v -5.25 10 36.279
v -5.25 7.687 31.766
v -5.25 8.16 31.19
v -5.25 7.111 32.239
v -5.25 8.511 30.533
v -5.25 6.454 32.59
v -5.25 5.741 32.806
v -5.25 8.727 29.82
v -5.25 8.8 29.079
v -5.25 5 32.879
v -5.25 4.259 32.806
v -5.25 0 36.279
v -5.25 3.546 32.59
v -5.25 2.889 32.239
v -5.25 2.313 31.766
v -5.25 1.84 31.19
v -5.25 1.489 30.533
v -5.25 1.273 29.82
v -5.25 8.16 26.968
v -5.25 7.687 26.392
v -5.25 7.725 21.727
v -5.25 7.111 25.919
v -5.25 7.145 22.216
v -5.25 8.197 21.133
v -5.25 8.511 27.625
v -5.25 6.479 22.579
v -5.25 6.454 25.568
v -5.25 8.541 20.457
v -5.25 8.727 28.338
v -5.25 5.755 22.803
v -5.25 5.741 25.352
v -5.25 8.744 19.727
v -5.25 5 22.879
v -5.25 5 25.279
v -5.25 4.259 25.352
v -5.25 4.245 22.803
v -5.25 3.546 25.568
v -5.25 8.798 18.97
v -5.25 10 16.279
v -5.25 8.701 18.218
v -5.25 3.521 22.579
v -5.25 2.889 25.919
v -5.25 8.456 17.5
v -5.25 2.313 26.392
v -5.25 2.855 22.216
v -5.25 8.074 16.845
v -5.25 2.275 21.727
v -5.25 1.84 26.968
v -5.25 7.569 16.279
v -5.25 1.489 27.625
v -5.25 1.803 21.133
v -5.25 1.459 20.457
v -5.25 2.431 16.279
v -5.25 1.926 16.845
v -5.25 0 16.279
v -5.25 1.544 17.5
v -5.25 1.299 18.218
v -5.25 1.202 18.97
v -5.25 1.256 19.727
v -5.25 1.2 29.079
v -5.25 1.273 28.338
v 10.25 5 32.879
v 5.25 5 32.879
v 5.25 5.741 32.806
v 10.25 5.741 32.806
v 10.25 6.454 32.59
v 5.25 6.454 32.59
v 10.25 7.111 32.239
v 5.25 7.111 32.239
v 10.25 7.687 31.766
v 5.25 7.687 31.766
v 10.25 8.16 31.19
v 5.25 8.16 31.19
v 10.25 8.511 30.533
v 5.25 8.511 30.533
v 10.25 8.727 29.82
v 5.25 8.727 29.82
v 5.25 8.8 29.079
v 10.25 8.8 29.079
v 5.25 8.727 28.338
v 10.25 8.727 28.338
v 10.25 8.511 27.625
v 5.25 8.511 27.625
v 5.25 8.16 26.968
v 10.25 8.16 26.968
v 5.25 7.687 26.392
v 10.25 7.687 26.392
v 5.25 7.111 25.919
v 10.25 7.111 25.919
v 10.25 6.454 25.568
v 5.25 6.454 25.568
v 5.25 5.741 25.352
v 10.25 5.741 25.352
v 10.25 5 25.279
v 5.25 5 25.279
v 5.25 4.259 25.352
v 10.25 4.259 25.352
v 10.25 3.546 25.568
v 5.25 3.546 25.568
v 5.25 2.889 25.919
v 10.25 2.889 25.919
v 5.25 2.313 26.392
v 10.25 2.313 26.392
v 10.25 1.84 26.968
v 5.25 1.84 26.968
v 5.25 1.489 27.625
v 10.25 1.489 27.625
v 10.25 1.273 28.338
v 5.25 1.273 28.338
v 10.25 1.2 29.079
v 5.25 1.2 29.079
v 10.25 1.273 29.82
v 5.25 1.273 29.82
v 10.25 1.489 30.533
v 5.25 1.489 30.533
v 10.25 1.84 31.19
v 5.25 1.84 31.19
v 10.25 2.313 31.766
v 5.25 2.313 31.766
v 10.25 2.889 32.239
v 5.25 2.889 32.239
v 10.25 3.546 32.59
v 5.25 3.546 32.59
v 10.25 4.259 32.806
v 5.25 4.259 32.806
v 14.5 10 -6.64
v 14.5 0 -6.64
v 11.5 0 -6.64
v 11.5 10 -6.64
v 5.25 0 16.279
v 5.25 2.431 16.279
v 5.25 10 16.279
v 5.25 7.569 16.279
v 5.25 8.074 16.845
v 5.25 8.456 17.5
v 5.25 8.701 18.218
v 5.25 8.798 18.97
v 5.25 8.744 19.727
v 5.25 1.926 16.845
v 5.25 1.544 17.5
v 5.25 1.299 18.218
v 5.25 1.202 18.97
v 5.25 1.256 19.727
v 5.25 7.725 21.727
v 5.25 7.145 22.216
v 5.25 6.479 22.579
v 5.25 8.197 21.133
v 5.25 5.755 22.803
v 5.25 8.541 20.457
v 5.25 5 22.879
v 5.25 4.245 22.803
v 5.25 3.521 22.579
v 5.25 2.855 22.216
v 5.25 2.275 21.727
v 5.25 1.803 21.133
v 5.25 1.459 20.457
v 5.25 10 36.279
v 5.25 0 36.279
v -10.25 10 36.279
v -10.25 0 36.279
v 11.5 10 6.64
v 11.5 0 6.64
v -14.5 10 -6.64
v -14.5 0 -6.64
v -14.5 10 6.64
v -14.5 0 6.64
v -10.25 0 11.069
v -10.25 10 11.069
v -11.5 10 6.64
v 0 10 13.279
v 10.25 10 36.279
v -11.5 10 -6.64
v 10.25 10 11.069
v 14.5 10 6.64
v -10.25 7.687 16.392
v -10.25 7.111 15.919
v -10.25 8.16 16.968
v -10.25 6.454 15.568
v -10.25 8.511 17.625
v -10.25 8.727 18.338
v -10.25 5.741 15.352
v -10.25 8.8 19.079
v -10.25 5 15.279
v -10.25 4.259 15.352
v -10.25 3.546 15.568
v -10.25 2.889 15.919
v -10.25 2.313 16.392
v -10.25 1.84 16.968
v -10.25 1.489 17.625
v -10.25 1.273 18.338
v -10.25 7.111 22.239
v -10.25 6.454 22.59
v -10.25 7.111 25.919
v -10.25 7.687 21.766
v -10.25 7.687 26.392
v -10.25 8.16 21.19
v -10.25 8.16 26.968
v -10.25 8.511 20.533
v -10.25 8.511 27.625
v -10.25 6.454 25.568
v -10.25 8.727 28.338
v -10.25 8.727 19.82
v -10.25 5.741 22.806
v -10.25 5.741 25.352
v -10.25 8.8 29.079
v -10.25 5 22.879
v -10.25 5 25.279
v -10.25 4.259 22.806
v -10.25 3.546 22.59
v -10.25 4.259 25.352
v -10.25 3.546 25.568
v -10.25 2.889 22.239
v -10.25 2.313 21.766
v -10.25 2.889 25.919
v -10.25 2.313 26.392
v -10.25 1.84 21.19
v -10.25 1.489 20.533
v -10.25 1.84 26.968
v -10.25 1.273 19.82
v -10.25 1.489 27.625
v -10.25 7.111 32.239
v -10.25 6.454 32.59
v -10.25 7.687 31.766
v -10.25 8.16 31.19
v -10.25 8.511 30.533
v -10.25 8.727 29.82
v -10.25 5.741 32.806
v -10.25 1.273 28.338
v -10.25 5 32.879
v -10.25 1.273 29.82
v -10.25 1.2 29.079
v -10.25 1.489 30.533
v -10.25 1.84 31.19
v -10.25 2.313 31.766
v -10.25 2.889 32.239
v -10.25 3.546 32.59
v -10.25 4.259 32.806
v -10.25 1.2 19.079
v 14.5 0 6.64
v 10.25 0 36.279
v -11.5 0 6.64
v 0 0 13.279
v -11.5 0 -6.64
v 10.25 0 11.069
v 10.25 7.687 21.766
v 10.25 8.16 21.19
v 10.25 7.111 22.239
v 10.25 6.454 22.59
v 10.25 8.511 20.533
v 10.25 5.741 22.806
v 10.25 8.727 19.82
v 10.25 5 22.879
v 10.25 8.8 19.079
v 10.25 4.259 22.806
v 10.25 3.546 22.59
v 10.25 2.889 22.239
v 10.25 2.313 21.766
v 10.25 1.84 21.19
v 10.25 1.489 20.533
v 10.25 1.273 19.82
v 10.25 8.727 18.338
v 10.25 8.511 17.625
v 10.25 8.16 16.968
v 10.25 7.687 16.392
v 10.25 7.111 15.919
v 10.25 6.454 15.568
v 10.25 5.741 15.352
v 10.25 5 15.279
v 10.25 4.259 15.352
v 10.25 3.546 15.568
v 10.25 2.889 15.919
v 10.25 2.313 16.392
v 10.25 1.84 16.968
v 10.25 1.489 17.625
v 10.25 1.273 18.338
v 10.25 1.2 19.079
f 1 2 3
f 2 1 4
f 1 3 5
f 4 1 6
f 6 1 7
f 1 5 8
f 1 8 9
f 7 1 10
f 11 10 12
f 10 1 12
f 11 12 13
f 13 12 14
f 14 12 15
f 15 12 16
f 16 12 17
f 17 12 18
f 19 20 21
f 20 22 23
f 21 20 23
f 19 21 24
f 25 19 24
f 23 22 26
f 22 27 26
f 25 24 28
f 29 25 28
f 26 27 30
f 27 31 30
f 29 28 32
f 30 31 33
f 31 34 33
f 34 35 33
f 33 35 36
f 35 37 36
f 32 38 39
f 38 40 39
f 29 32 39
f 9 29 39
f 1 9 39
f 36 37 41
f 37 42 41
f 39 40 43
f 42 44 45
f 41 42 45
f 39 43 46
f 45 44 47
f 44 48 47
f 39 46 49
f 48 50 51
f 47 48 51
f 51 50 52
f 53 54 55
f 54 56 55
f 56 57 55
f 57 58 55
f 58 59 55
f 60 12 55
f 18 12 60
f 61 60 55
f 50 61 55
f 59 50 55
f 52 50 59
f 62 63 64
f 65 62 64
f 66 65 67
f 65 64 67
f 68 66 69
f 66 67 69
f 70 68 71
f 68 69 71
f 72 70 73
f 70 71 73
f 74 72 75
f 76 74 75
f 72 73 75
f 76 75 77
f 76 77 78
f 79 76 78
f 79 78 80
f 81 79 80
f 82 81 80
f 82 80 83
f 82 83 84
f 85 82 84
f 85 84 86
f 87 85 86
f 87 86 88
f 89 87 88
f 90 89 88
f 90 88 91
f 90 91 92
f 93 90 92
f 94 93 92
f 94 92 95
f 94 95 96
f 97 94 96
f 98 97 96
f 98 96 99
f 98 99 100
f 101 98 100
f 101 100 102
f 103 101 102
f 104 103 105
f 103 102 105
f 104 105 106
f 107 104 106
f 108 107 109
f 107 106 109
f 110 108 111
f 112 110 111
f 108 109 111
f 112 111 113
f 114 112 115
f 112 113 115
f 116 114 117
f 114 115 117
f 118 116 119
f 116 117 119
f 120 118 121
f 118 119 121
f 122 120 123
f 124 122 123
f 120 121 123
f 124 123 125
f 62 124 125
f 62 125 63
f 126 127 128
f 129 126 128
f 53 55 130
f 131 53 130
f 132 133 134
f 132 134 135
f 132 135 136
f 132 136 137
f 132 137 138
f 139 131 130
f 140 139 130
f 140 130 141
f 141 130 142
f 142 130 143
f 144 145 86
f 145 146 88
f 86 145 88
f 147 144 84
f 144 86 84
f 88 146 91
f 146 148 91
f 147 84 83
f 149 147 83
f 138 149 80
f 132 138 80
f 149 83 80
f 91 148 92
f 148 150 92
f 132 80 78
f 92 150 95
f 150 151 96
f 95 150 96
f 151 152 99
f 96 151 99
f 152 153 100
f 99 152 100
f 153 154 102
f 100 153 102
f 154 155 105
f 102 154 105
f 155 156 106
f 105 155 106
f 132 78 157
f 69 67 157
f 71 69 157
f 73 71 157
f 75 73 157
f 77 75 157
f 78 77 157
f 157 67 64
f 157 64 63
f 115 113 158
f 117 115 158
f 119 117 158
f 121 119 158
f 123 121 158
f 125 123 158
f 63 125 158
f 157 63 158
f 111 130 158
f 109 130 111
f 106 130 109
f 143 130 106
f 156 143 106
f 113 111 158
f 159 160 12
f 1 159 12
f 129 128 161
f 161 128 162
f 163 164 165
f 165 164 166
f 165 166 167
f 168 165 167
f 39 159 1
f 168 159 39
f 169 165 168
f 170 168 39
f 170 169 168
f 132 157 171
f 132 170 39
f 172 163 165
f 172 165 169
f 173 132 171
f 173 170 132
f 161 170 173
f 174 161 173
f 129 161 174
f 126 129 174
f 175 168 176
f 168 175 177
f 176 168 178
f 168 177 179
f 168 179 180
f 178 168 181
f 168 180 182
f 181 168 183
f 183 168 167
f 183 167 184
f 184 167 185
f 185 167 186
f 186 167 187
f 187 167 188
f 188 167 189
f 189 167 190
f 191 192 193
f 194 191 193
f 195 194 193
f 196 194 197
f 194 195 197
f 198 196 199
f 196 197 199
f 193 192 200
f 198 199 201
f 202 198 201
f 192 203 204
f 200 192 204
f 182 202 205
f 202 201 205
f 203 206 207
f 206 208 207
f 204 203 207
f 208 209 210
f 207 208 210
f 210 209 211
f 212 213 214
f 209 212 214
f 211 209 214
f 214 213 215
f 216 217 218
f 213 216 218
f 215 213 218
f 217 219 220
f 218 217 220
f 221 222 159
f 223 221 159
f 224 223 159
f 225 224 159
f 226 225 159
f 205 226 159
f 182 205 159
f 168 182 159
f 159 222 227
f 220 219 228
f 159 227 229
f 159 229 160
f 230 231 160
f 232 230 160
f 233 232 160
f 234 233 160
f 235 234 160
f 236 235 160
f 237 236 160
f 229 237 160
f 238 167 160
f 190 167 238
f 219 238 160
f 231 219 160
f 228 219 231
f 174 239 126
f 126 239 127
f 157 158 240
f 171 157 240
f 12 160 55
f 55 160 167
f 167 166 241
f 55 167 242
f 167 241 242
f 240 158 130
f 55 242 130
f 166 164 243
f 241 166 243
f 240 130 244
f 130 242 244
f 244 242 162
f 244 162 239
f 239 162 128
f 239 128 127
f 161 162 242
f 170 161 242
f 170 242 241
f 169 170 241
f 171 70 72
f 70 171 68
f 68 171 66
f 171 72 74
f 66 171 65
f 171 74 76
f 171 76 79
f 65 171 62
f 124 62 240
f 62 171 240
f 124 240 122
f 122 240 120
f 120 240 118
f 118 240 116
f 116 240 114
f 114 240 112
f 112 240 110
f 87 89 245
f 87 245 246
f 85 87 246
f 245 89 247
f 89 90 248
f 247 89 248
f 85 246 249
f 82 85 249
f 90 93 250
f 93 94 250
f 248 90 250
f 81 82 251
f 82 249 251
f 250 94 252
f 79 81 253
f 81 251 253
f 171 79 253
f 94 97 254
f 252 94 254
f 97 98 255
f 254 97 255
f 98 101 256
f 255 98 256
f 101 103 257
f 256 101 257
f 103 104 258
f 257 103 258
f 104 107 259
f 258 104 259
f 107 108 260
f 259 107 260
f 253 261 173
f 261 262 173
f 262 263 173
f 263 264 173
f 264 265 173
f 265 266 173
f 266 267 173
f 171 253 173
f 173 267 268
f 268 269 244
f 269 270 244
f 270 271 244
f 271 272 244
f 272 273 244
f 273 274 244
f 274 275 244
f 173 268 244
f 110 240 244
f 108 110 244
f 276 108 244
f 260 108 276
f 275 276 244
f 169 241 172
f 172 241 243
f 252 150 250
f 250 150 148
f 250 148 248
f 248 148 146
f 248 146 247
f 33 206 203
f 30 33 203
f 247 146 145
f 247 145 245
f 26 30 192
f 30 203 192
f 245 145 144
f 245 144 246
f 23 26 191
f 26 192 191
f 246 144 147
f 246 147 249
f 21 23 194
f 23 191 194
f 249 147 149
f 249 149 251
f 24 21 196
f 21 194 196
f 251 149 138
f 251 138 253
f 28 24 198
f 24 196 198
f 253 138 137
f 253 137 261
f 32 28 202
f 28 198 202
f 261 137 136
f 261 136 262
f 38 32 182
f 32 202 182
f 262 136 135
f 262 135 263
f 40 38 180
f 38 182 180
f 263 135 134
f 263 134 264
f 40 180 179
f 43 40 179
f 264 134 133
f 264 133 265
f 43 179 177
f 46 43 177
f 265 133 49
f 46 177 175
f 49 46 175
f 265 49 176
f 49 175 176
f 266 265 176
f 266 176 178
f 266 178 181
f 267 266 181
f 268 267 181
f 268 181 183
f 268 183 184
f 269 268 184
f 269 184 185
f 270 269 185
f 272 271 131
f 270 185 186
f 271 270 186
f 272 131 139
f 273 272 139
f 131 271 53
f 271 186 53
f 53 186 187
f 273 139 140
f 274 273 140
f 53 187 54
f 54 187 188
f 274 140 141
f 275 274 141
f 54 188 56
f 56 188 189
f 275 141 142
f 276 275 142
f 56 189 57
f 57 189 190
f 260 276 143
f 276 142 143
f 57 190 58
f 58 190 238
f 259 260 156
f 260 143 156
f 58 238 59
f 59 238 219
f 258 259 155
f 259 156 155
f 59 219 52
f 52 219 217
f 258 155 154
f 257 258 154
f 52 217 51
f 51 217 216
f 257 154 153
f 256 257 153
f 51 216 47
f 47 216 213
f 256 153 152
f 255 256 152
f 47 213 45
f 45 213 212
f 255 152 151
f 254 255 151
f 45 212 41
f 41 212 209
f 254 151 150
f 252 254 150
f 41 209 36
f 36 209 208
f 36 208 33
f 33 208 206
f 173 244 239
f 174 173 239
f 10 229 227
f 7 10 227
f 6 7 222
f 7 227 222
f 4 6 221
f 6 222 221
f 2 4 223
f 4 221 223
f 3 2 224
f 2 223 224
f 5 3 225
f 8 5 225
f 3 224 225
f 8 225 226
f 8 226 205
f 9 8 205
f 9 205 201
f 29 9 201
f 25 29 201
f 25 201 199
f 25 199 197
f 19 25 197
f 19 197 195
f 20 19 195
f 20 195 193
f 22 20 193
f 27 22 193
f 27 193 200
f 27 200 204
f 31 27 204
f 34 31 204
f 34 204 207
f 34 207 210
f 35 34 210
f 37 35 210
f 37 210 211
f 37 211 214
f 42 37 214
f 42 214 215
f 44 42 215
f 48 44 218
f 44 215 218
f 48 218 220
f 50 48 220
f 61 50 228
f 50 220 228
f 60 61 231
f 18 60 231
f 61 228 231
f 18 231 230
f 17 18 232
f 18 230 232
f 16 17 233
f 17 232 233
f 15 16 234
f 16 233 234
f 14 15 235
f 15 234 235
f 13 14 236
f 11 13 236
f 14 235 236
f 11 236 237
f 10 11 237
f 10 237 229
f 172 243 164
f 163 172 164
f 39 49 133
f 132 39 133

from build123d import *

# Parameters (mm, degrees)
BOSS_EXTRUDE1_DEPTH = 10
SKETCH3_R           = 3.8
CUT_EXTRUDE1_DEPTH  = 46.041452221


with BuildPart() as part:
    # Sketch1 → Boss-Extrude1 (new body)
    with BuildSketch(Plane(origin=(0, 0, 0), x_dir=(1, 0, 0), z_dir=(0, 1, 0))):
        Polygon((-11.5, -6.639528096), (-11.5, 6.639528096), (-14.5, 6.639528096), (-14.5, -6.639528096), (-10.25, -11.068500464), (-10.25, -36.279056191), (-5.25, -36.279056191), (-5.25, -16.279056191), (5.25, -16.279056191), (5.25, -36.279056191), (10.25, -36.279056191), (10.25, -11.068500464), (14.5, -6.639528096), (14.5, 6.639528096), (11.5, 6.639528096), (11.5, -6.639528096), (0, -13.279056191), align=None)
    extrude(amount=BOSS_EXTRUDE1_DEPTH)

    # Sketch3 → Cut-Extrude1 (cut, through all)
    with BuildSketch(Plane.ZY.offset(10.25)):
        with Locations((19.079056191, 5)):
            Circle(SKETCH3_R)
        with Locations((29.079056191, 5)):
            Circle(SKETCH3_R)
    extrude(amount=-CUT_EXTRUDE1_DEPTH, mode=Mode.SUBTRACT)


solid = part.part
